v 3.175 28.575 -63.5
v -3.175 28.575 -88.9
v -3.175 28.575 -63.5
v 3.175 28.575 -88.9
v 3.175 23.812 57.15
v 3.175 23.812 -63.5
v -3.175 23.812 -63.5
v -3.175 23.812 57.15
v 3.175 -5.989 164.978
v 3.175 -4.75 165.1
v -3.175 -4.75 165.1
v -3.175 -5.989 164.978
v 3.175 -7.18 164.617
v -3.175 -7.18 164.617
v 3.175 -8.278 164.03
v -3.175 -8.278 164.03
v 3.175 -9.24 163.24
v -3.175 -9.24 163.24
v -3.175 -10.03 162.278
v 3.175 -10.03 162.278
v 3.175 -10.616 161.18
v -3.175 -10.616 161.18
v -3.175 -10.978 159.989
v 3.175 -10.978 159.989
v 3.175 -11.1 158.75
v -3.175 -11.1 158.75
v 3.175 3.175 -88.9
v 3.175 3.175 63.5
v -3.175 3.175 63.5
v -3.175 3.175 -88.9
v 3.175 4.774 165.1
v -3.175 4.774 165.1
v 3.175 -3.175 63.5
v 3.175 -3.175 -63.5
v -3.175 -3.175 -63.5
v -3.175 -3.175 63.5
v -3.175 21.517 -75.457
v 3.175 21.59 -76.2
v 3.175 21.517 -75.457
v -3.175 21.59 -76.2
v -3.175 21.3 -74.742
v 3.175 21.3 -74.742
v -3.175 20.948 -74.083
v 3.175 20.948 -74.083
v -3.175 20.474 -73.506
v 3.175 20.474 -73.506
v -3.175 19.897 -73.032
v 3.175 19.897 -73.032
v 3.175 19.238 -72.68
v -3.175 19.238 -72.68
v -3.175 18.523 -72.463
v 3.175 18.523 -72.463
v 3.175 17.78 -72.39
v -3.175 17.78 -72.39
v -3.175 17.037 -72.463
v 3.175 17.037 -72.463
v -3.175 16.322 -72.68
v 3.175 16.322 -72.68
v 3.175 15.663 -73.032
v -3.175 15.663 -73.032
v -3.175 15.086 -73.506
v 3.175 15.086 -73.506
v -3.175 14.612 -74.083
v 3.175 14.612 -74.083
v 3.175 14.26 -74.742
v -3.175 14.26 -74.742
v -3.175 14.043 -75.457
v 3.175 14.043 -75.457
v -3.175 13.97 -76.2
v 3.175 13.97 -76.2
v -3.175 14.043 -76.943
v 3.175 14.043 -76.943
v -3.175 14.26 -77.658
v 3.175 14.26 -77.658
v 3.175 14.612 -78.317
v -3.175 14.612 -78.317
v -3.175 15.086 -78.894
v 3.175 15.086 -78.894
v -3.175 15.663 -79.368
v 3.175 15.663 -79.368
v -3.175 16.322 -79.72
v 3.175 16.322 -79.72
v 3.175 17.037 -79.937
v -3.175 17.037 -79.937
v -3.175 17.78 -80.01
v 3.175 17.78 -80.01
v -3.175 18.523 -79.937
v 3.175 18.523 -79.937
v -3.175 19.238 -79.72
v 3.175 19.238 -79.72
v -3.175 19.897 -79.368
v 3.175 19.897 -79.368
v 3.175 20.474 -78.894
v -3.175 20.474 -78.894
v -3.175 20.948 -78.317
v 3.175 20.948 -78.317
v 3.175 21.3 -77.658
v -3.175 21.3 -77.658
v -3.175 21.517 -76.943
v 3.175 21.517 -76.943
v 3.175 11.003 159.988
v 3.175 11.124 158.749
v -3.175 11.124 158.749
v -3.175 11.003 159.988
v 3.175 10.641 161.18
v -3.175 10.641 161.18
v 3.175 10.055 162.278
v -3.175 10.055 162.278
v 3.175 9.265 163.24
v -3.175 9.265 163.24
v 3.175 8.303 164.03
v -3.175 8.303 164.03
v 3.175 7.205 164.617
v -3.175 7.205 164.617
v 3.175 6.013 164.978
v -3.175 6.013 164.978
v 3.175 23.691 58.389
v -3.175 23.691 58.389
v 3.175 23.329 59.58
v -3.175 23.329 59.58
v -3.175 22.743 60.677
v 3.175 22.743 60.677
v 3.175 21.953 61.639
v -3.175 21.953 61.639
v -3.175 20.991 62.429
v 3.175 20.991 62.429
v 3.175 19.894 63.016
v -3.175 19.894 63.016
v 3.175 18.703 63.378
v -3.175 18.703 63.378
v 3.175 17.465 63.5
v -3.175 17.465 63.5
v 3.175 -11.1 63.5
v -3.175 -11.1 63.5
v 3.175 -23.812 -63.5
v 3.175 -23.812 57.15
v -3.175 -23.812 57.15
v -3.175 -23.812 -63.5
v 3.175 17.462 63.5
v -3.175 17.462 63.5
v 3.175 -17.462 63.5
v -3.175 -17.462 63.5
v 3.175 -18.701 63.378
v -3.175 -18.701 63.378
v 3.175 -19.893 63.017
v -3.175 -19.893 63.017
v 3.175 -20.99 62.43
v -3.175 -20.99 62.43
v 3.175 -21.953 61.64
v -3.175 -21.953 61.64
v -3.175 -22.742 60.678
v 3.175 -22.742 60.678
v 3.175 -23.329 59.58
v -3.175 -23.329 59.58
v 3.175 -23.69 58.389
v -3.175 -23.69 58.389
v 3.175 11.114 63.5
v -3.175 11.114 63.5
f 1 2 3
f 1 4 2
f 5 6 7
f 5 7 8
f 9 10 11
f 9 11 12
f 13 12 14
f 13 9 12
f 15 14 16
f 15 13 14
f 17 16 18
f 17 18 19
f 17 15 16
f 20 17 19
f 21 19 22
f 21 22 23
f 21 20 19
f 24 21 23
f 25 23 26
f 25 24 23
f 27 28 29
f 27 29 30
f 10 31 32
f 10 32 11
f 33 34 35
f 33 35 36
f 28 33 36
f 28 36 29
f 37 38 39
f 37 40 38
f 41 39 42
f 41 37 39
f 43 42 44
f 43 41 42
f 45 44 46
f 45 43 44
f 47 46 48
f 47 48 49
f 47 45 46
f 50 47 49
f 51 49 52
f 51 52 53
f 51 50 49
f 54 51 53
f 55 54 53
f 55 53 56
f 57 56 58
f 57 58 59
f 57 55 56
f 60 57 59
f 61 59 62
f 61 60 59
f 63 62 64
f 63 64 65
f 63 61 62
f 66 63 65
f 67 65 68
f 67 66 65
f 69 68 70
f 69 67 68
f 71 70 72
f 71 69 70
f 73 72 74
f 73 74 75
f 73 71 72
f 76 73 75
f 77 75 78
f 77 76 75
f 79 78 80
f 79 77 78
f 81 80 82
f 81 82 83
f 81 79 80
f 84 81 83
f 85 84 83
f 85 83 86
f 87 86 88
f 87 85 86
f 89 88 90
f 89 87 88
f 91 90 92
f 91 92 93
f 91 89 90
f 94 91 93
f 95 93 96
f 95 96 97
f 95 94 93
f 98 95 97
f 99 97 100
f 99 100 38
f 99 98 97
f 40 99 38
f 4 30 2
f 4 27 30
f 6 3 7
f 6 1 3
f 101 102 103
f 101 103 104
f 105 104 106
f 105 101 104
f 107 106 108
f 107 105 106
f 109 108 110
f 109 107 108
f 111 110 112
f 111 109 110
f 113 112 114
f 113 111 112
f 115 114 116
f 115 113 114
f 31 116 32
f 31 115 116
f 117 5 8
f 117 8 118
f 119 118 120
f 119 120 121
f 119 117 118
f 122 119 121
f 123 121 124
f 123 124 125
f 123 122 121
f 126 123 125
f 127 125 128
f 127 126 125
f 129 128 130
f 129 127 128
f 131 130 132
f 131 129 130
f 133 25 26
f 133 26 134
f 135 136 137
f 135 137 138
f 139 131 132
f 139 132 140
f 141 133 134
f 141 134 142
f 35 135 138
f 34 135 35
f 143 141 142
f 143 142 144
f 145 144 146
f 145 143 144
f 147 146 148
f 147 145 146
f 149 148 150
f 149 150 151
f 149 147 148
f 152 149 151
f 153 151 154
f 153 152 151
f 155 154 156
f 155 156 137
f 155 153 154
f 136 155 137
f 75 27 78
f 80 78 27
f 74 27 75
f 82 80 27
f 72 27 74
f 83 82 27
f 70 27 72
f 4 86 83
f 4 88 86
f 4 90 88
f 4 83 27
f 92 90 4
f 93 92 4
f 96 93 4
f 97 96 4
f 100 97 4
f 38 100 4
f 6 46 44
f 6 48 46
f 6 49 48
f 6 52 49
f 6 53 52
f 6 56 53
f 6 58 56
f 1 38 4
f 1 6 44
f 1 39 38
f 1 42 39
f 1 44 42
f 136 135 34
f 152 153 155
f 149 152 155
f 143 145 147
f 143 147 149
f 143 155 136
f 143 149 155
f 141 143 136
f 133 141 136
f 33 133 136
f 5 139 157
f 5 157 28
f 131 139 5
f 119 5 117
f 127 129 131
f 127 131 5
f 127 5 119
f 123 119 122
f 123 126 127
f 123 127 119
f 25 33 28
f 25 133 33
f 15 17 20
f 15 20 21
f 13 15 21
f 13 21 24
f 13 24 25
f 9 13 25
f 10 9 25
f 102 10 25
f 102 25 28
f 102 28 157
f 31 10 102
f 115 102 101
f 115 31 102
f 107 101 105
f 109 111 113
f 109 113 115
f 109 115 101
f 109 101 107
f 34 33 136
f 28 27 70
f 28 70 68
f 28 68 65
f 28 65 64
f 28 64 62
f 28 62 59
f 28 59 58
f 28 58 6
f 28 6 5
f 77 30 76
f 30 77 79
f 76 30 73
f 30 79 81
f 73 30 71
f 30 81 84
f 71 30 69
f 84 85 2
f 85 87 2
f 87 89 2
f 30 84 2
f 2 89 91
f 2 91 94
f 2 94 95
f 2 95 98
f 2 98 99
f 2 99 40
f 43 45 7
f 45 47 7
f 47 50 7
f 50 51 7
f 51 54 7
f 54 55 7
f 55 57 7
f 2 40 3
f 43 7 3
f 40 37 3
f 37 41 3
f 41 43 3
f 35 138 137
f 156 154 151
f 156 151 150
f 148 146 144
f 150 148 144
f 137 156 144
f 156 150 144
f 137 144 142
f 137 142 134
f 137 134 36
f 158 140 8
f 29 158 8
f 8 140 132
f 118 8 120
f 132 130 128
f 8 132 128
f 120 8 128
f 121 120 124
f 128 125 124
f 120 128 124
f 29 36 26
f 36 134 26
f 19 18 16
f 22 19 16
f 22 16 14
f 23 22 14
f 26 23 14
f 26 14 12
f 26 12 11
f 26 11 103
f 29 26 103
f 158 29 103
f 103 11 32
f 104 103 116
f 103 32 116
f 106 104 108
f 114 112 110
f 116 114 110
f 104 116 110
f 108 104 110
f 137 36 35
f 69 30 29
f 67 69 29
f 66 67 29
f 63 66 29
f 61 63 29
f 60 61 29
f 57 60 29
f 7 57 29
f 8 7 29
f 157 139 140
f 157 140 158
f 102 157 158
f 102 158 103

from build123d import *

# Parameters (mm, degrees)
F0_R     = 3.81
F1_DEPTH = 3.175


# Not quite as in the source:
# - ends of sketch curves that miss each other by under 0.0002 mm in the source are joined


with BuildPart() as f1:
    # F0 (on Right) → F1 (new body, symmetric)
    with BuildSketch(Plane.YZ):
        Polygon((28.575, -63.5), (23.8125, -63.5), (3.175, -63.5), (3.175, -88.9), (28.575, -88.9), align=None)
        with Locations((17.78, -76.2)):
            Circle(F0_R, mode=Mode.SUBTRACT)
        with BuildLine():
            Line((3.175, -63.5), (23.8125, -63.5))
            Line((23.8125, -63.5), (23.8125, 57.15))
            ThreePointArc((23.8125, 57.15), (21.9533763667, 61.6393796296), (17.4646167058, 63.4999996472))
            Line((17.4646167058, 63.4999996472), (17.4625, 63.5))
            Line((17.4625, 63.5), (11.1139111112, 63.5))
            Line((11.1139111112, 63.5), (11.124494366, 158.7492930333))
            ThreePointArc((11.124494366, 158.7492930333), (9.2648719104, 163.2398771909), (4.7744944052, 165.0999985889))
            Line((4.7744944052, 165.0999985889), (-4.7498, 165.0999985889))
            ThreePointArc((-4.7498, 165.0999985889), (-9.2399280605, 163.2401266494), (-11.0998, 158.7499985889))
            Line((-11.0998, 158.7499985889), (-11.0998, 63.5))
            Line((-11.0998, 63.5), (-17.4498, 63.5))
            Line((-17.4498, 63.5), (-17.4625, 63.5))
            ThreePointArc((-17.4625, 63.5), (-21.9526280605, 61.6401280605), (-23.8125, 57.15))
            Line((-23.8125, 57.15), (-23.8125, -63.5))
            Line((-23.8125, -63.5), (-3.175, -63.5))
            Line((-3.175, -63.5), (-3.175, 63.5))
            Line((-3.175, 63.5), (3.175, 63.5))
            Line((3.175, 63.5), (3.175, -63.5))
        make_face()
    extrude(amount=F1_DEPTH, both=True)


solid = f1.part
